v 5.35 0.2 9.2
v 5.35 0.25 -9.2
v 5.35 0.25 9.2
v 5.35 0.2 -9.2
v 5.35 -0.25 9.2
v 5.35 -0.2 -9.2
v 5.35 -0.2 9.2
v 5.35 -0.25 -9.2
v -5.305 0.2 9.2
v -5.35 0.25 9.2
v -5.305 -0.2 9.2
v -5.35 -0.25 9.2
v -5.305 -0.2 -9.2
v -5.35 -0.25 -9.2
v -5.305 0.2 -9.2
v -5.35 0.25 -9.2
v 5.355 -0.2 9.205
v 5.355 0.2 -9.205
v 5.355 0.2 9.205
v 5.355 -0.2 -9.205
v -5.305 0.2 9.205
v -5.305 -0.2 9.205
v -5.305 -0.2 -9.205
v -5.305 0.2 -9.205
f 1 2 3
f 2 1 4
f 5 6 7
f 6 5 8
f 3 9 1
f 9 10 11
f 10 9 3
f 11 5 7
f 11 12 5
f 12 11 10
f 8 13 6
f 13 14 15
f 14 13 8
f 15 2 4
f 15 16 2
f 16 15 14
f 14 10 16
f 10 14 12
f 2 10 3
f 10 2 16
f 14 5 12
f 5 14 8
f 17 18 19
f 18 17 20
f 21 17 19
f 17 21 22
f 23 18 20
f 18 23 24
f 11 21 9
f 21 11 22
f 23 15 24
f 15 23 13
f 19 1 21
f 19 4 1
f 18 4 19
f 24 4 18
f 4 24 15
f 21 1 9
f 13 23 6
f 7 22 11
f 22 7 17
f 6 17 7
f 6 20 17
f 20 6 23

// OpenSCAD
/** book.scad - simple parametrizable book shape
 *  for robot manipulation experiments.
 *
 * Dimensions are in millimeters; scale by 0.001 for ROS.
 * Origin is at the center of the book.
 * 
 * (c) 2019, fnh, hendrich@informatik.uni-hamburg.de
 */
 
$fn = 50;
eps = 0.01;
demo = false; 
 

if (demo) { 
translate( [0,0,0] )  book(); // A4 size, soft cover
translate( [0,10,0] ) minski_society_of_mind();
translate( [0,20,0] ) reichelt_2018();
translate( [0,30,0] ) knuth_aocp();
translate( [0,40,0] ) hamburg_guide();
}


// translate( [0,0,0] ) minski_society_of_mind();
// translate( [0,0,0] ) knuth_aocp();
translate( [0,0,0] ) hamburg_guide();


// Knuth, AoCP volume 1
module knuth_aocp() {
book( height=24.0, width=16.5, thickness=8, // 3.7,
      cover_thickness=0.5,
      back_radius = 8,
      cover_color = [0.999,0.9,0.5] ,
      paper_color = [0.95,0.95,0.93]
     );
}


// Minsky, Society of Mind
module minski_society_of_mind() {
book( height=29.7, width=21.0, thickness=2.0,
      cover_thickness=0.3,
      cover_color = [0.999,0.9,0.5] ,
      paper_color = [0.95,0.95,0.93]
     );
}


// Reichelt catalogue 06.2018
module reichelt_2018() {
book( height=22.3, width=17.0, thickness=4.0,
      cover_thickness=0.2,
      cover_color = [0.7,0.7,0.7] ,
      paper_color = [0.95,0.95,0.93]
     );
}

 
// Hamburg guide IROS2015
module hamburg_guide() {
book( height=18.4, width=10.7, thickness=0.5,
      cover_thickness=0.1,
      cover_color = [0.0,0.4,0.7] ,
      paper_color = [0.95,0.95,0.93]
     );
}
 
 
module book(
  height = 29.7, 
  width = 21.0, 
  thickness = 2.0, 
  weight = 1.0,
  back_radius = 0, // or zero for flat
  cover_thickness = 0.3, // or zero for soft cover cover
  cover_color = [0.6, 0.3, 0.2],
  paper_color = [0.9, 0.9, 0.9],
)
{
  if (back_radius == 0) {
    color( cover_color ) 
      cube( size=[width,thickness,height], center=true );   
    delta = 0.01;
    color( paper_color ) 
      translate( [cover_thickness/4,0,0] )
      cube( size=[width-cover_thickness/2+delta,thickness-cover_thickness,height+delta], center=true );   
  } 
  else {
    difference() {
      
      intersection() {
        union() {
          translate( [-back_radius,0,0] ) 
            cube( size=[width, max( 2*back_radius, thickness ), height+eps], center=true );
          translate( [width/2-back_radius,0,0] )
            cylinder( r = back_radius, h=height+2*eps, center=true );
        }
        translate( [0,0,0] )
          cube( size=[width,thickness,height], center=true );   
      }
      
      alpha = atan2( thickness/2, back_radius );
      echo( alpha );
      dx = back_radius - back_radius*cos( alpha );
      // dx = 0.1;
      
      echo( dx );
      translate( [-width/2 - back_radius + dx,0,0] )
        cylinder( r = back_radius, h=height+2*eps, center=true );
    
   } // intersection
  } // difference
 
  
}
